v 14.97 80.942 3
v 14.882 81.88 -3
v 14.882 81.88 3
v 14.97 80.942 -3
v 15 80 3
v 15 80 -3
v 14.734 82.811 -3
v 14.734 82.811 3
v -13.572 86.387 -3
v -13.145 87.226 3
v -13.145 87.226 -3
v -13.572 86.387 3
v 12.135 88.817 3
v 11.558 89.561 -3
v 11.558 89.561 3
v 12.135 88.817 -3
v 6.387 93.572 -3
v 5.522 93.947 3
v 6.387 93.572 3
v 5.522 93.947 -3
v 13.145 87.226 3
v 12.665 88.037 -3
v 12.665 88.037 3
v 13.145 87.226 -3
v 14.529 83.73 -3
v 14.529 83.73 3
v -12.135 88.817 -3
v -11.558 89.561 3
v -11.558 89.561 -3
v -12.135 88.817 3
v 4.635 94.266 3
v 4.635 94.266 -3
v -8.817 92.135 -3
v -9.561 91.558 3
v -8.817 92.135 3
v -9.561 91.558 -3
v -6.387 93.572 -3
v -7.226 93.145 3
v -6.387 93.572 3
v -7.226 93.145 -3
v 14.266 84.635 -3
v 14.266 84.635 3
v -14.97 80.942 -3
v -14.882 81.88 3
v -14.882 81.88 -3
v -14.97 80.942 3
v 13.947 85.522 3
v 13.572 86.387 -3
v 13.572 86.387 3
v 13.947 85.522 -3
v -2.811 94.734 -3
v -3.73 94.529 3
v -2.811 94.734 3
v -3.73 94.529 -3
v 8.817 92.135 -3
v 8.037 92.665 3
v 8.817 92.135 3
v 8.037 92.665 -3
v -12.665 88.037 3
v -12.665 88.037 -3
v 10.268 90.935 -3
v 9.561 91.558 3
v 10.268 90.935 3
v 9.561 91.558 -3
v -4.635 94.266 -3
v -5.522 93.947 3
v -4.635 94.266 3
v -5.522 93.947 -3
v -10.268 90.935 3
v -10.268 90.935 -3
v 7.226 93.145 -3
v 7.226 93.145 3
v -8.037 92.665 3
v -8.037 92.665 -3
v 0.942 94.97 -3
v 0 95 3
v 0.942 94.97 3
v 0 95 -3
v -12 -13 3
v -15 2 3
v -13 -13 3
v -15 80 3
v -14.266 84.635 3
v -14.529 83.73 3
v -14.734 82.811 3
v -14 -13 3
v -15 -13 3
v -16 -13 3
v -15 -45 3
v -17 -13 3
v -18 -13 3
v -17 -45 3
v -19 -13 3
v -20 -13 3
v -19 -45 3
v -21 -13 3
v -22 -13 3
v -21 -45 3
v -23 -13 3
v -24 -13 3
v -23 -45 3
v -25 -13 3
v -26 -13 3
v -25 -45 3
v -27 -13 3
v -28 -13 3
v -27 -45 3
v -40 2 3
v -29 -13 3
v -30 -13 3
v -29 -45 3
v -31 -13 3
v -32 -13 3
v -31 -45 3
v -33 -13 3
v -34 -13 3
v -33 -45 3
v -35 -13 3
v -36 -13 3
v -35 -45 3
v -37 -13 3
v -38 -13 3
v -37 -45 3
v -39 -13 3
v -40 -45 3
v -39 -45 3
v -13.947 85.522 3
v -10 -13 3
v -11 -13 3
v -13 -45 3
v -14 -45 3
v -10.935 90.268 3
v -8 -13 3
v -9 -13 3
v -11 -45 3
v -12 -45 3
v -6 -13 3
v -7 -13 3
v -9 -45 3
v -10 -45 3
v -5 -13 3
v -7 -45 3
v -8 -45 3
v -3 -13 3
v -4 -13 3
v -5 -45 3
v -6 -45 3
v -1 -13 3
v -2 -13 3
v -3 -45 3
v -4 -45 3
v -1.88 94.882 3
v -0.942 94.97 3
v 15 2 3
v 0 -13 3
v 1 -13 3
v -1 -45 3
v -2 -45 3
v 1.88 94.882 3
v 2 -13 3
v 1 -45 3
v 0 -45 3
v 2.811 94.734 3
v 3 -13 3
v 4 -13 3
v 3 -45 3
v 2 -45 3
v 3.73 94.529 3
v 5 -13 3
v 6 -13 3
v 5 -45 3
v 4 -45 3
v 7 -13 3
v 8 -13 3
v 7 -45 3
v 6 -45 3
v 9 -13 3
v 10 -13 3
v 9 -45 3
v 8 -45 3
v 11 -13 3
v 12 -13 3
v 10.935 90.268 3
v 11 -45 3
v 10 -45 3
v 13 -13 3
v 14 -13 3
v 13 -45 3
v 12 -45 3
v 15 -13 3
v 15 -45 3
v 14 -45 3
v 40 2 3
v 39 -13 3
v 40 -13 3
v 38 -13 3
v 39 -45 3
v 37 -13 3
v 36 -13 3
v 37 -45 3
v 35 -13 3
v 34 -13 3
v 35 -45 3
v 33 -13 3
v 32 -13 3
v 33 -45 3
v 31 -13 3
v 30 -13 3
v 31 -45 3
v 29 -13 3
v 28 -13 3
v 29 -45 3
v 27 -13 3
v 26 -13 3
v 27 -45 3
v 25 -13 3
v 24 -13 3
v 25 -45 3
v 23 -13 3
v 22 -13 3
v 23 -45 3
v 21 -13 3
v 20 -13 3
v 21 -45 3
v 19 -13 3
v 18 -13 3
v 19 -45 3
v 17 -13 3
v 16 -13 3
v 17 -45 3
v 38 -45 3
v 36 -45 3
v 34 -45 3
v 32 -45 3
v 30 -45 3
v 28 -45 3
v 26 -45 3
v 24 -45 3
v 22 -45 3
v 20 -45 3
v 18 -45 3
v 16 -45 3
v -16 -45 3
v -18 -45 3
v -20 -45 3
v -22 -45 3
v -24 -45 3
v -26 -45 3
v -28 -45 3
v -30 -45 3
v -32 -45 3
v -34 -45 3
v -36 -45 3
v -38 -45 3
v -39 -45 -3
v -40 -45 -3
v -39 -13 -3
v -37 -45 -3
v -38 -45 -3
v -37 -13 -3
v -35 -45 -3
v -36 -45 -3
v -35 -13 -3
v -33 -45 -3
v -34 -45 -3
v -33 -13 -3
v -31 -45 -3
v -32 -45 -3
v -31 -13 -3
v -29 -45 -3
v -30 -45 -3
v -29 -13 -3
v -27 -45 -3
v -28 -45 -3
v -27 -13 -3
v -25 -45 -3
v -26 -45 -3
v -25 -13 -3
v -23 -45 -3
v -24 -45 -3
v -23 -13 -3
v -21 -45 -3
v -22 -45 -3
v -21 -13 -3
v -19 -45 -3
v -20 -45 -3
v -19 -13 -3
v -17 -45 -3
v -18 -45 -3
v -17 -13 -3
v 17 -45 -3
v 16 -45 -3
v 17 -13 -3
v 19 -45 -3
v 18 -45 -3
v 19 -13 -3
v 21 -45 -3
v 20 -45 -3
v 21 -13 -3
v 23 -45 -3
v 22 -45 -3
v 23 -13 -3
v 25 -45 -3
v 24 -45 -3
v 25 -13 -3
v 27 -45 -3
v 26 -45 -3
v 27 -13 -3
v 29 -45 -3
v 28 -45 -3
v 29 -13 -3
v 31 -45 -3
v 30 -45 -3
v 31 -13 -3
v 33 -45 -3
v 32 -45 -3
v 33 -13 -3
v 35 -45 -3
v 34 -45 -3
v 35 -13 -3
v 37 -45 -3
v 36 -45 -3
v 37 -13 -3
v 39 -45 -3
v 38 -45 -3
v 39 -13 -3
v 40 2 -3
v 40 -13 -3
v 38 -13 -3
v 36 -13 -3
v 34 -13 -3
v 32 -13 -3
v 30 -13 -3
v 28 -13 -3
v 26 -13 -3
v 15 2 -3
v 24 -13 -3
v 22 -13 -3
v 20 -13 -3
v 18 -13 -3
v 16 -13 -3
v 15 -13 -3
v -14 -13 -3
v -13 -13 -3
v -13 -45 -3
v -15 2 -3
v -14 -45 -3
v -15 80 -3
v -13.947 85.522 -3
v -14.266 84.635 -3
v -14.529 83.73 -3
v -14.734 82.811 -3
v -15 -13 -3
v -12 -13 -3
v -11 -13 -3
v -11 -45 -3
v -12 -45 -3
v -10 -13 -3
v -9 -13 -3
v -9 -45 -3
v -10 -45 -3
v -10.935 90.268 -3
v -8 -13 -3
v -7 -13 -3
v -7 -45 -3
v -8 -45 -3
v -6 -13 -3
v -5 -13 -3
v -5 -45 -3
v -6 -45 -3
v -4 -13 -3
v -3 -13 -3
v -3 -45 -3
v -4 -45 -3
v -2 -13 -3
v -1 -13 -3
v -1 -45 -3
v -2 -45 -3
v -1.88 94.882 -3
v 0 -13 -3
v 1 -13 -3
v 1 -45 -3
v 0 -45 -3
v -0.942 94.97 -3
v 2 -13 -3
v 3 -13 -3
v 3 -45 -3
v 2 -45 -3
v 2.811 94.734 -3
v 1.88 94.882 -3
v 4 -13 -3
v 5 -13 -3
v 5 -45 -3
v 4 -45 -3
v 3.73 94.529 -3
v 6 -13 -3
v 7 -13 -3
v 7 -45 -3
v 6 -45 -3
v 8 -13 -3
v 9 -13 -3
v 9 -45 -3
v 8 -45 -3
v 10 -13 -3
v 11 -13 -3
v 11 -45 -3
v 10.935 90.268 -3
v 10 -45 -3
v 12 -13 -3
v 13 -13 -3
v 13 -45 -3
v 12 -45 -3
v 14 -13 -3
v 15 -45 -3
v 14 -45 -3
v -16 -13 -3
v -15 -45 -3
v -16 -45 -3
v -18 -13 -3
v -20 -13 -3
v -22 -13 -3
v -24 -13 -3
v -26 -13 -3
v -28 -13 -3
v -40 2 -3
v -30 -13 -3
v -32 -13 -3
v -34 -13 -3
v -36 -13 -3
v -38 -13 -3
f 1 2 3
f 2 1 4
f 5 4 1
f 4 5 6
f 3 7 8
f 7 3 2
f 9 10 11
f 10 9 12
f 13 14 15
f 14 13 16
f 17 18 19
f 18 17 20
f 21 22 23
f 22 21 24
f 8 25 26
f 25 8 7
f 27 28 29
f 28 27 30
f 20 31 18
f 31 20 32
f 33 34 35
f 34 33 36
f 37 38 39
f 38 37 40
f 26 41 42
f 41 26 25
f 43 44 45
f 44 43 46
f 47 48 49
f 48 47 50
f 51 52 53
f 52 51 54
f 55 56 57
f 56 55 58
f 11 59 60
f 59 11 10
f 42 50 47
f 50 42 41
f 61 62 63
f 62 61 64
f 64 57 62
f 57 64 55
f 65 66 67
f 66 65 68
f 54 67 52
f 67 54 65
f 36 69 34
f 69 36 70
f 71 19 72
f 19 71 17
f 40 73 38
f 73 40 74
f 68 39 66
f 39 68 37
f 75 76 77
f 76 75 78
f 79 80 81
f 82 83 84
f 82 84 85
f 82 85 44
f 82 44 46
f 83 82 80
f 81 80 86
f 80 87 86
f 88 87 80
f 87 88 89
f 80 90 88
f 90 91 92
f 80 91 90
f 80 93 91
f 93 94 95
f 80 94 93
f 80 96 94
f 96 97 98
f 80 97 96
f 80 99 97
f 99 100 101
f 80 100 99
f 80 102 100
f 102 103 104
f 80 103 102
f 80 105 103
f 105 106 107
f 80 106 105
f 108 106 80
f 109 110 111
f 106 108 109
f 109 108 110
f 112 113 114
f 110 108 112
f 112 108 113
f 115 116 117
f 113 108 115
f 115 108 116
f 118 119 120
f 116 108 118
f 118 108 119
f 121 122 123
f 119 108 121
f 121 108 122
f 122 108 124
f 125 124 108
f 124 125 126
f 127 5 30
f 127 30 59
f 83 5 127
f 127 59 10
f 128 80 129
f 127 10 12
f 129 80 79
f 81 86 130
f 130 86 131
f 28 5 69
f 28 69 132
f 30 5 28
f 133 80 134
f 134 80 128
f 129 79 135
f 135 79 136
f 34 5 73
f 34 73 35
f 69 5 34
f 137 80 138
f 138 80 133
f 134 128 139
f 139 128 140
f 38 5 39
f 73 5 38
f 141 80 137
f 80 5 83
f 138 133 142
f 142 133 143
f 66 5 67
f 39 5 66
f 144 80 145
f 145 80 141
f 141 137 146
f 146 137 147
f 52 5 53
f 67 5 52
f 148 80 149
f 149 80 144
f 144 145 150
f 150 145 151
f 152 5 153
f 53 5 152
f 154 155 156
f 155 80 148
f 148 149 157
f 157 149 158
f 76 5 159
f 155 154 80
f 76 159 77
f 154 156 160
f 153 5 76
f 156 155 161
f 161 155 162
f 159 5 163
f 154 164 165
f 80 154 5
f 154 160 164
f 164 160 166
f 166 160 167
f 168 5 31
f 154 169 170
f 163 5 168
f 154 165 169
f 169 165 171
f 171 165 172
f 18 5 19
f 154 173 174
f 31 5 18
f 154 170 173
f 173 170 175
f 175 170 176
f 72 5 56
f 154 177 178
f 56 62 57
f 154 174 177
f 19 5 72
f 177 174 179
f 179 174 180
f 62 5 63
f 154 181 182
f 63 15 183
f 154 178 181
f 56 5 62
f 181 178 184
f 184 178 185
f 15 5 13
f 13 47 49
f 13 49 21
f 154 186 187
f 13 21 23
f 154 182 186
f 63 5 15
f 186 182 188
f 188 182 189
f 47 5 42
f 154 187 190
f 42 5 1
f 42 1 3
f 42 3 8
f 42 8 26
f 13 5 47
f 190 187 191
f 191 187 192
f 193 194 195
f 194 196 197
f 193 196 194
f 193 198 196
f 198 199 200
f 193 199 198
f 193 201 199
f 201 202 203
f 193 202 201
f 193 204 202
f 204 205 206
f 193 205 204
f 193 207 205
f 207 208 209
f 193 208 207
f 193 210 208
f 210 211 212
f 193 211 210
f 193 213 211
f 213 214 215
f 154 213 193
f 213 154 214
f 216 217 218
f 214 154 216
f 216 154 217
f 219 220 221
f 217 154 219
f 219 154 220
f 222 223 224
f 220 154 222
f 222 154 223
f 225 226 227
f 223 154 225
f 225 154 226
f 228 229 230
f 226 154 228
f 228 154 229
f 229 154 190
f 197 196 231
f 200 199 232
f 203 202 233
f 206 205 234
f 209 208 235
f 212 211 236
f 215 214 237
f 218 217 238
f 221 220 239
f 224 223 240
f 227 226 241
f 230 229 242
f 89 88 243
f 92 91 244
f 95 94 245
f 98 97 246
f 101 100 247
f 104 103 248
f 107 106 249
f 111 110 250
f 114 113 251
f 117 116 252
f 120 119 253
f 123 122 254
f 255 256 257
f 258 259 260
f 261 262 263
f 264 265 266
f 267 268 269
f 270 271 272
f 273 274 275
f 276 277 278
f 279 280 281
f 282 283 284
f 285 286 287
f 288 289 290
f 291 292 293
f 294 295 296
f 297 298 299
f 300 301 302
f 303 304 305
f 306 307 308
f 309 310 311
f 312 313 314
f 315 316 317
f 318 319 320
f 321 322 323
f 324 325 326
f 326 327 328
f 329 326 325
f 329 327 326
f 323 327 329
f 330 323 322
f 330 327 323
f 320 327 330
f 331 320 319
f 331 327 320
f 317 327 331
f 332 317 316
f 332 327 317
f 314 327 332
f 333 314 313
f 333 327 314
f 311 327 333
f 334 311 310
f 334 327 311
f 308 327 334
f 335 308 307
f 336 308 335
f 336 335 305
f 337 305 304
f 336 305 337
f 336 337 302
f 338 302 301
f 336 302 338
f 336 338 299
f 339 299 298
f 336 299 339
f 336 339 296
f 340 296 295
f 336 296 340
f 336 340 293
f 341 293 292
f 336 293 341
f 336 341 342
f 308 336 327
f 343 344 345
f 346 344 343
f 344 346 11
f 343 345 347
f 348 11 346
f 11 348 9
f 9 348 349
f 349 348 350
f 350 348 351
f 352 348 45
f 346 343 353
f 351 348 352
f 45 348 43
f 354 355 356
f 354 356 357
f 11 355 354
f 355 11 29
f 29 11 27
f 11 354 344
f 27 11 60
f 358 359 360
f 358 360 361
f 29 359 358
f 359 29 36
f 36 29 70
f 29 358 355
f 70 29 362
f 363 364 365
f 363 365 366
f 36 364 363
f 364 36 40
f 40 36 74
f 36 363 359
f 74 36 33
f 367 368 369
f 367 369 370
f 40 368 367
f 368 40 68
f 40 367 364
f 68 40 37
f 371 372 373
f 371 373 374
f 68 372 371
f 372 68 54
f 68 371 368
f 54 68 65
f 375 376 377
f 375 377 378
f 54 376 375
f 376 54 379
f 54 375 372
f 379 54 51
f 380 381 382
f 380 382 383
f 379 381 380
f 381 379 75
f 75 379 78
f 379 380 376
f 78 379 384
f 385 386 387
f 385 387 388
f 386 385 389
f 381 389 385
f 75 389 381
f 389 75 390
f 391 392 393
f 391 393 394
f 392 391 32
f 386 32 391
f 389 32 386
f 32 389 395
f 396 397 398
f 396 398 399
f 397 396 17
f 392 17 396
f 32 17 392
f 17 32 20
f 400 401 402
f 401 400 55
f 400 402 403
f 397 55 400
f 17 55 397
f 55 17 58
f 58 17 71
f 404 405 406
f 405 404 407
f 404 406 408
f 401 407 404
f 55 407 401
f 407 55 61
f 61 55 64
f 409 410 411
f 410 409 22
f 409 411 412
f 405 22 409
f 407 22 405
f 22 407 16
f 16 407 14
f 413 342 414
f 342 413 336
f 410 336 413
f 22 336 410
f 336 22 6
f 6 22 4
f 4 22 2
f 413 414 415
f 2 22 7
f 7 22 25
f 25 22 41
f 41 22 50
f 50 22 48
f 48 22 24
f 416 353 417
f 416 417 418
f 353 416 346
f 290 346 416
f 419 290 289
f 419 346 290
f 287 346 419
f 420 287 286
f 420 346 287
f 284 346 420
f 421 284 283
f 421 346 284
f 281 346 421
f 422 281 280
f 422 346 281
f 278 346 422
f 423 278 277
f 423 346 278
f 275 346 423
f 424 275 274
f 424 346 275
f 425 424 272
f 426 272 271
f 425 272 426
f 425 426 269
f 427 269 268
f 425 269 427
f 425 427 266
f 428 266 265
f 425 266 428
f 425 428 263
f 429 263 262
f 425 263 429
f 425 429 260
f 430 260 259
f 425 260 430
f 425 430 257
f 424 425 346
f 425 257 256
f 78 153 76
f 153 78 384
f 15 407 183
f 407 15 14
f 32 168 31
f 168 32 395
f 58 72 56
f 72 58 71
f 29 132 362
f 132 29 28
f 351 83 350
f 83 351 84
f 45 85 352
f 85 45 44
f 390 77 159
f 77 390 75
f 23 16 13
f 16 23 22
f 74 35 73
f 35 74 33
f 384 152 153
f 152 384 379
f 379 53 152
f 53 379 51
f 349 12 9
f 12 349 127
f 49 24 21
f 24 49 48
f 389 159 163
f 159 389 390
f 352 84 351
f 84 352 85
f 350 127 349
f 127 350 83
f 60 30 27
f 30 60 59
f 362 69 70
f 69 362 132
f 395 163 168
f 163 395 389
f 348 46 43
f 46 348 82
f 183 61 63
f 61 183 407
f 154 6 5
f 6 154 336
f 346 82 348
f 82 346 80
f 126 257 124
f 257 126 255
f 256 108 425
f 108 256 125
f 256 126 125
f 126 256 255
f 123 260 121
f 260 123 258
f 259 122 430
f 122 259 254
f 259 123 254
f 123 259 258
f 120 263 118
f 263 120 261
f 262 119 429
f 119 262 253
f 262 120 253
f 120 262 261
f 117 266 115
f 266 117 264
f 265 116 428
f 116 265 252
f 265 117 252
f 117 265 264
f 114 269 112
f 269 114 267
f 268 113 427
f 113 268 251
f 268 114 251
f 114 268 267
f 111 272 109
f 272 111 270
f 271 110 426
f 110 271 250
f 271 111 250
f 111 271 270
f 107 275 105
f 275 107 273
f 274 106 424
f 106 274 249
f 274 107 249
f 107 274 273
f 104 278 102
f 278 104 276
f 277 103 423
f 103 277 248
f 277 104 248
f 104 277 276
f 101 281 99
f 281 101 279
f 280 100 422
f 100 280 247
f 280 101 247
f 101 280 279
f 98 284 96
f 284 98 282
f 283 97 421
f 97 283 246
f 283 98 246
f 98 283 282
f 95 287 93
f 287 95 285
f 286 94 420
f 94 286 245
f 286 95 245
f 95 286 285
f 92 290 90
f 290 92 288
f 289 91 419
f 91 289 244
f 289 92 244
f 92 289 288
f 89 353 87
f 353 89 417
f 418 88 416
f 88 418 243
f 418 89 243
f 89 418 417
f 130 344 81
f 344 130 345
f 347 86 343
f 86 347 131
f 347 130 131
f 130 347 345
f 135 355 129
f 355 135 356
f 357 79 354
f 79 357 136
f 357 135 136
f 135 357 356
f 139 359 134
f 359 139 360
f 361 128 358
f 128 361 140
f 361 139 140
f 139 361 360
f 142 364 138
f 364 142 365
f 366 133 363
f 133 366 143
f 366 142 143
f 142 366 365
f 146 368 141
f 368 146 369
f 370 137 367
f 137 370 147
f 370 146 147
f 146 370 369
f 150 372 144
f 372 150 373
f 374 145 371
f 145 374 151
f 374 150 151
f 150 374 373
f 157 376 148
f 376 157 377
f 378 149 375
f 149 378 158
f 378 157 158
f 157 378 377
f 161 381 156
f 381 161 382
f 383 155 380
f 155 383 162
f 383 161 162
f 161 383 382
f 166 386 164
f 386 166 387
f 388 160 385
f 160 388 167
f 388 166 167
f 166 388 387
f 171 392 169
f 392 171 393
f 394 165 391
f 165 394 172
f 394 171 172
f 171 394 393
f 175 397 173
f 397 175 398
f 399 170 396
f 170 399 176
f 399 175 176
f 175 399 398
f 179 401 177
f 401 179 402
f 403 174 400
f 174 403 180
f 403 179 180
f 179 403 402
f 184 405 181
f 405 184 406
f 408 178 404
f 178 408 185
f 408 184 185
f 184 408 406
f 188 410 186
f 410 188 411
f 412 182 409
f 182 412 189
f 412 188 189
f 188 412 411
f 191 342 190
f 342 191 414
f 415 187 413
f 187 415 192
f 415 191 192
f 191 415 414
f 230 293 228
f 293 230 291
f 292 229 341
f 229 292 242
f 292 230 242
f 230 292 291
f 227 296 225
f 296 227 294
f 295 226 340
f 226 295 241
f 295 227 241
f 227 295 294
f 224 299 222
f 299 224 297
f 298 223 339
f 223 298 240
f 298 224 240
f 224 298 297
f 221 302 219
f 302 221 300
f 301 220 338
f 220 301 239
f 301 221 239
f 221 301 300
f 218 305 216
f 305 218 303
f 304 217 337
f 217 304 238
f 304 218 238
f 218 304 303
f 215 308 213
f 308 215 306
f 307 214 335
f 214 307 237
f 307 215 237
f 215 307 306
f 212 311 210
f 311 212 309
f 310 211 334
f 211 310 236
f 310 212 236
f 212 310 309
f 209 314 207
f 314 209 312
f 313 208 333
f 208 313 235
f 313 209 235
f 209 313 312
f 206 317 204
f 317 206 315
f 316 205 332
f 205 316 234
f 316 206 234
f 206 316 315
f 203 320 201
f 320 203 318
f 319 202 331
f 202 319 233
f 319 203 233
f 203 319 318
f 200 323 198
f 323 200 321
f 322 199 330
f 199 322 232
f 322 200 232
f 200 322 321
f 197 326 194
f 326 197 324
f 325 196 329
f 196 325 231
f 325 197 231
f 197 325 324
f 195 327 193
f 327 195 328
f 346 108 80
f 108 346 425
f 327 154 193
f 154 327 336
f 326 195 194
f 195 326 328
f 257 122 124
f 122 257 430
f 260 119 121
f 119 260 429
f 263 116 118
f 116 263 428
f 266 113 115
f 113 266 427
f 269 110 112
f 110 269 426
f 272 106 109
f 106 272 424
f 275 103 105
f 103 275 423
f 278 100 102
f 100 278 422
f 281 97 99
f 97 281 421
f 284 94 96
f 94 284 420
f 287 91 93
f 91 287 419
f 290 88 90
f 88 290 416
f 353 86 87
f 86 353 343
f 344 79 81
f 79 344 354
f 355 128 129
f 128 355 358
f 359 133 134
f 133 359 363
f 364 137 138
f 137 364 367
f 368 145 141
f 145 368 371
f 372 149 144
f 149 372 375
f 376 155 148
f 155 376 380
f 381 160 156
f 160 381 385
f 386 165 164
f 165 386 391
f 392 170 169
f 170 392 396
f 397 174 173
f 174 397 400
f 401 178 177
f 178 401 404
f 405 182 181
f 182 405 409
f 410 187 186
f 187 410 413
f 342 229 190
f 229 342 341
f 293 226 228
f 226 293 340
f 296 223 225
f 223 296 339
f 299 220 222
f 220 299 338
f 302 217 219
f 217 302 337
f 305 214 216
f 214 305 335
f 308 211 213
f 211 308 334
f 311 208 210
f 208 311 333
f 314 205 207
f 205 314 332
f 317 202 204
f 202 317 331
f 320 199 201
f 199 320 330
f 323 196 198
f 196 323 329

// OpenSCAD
//Value of a = height of handle
//Value of b = width of comb
//Value of c = length of teeth

a = 80;
b = 80;
c = 45;

module handle()
{
	translate([0, a, 0])
	cylinder(h=6,r=15,$fn=100, center=true);

	translate([-15,0, -3])
	resize([30, a, 6])
	cube(30, 30, 6);
}//end module handle

handle();

module base()
{
	translate([-b/2, -13, -3])
	resize([b, 15, 6])
	cube(1, 1, 1);
}//end base

base();

for ( i = [0 : (b/2)-1] )
{
   
    translate([(i+i)-b/2, -c, -3])
	 resize([1, c, 6])
    cube(2, 2, 2);
}
